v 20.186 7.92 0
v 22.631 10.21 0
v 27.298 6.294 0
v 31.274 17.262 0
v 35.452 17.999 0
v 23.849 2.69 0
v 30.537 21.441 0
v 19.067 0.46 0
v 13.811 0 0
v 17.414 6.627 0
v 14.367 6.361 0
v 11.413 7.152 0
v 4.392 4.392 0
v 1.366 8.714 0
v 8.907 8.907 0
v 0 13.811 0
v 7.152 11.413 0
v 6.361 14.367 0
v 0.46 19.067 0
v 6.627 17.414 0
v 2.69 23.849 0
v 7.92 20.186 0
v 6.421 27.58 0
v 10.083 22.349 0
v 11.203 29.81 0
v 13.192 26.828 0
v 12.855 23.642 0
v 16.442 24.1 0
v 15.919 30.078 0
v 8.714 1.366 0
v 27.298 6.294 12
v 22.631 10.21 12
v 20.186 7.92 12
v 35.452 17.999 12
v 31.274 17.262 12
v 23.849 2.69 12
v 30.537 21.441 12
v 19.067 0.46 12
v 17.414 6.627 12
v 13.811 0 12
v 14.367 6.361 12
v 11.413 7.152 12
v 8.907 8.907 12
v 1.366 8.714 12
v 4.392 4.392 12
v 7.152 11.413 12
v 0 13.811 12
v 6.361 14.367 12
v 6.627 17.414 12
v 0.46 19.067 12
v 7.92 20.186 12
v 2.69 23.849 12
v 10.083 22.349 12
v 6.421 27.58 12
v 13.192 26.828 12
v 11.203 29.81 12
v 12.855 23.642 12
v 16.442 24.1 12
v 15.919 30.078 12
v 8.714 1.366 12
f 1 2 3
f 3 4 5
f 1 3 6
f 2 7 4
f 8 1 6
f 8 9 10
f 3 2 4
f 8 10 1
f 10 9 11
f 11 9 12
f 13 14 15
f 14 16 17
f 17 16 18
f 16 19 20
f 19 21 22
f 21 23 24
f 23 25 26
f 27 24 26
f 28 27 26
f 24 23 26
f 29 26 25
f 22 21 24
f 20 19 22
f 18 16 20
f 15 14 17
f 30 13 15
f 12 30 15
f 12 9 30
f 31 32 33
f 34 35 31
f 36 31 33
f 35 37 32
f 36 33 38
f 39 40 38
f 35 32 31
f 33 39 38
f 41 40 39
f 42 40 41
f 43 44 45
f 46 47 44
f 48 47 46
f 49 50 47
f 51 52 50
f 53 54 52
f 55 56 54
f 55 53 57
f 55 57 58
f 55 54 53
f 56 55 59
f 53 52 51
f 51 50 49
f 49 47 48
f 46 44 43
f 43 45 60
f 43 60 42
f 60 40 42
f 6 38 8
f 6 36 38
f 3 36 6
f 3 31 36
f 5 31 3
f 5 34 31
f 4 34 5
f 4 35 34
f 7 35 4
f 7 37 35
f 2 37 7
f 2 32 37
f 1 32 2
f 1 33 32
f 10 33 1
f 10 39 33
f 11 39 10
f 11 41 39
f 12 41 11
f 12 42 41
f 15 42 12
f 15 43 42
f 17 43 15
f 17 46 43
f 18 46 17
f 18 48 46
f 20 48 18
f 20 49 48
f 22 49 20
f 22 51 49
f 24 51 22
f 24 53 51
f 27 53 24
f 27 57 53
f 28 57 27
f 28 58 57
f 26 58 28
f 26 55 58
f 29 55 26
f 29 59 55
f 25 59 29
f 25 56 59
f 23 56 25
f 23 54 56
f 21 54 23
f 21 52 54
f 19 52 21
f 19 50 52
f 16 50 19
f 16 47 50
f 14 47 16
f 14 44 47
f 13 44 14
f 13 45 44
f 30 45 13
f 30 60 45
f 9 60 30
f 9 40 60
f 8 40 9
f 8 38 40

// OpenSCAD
$fn = 32;

// ----------------------------------------------------------------------
// Eye lug: ring_tail, 12 mm thick
// ----------------------------------------------------------------------

// --- parameters (mm) ---
profile_height = 12;      // extrusion height
profile_points = 30;      // points of the closed outline

profile = [[13.192, 26.828], [15.919, 30.078], [11.203, 29.81], [6.421, 27.58], [2.69, 23.849], [0.46, 19.067], [0, 13.811], [1.366, 8.714], [4.392, 4.392], [8.714, 1.366], [13.811, 0], [19.067, 0.46], [23.849, 2.69], [27.298, 6.294], [35.452, 17.999], [31.274, 17.262], [30.537, 21.441], [22.631, 10.21], [20.186, 7.92], [17.414, 6.627], [14.367, 6.361], [11.413, 7.152], [8.907, 8.907], [7.152, 11.413], [6.361, 14.367], [6.627, 17.414], [7.92, 20.186], [10.083, 22.349], [12.855, 23.642], [16.442, 24.1]];  // single closed polygon, 30 points, counter clockwise

// --- the one profile operation ---
linear_extrude(height = profile_height) polygon(points = profile);
